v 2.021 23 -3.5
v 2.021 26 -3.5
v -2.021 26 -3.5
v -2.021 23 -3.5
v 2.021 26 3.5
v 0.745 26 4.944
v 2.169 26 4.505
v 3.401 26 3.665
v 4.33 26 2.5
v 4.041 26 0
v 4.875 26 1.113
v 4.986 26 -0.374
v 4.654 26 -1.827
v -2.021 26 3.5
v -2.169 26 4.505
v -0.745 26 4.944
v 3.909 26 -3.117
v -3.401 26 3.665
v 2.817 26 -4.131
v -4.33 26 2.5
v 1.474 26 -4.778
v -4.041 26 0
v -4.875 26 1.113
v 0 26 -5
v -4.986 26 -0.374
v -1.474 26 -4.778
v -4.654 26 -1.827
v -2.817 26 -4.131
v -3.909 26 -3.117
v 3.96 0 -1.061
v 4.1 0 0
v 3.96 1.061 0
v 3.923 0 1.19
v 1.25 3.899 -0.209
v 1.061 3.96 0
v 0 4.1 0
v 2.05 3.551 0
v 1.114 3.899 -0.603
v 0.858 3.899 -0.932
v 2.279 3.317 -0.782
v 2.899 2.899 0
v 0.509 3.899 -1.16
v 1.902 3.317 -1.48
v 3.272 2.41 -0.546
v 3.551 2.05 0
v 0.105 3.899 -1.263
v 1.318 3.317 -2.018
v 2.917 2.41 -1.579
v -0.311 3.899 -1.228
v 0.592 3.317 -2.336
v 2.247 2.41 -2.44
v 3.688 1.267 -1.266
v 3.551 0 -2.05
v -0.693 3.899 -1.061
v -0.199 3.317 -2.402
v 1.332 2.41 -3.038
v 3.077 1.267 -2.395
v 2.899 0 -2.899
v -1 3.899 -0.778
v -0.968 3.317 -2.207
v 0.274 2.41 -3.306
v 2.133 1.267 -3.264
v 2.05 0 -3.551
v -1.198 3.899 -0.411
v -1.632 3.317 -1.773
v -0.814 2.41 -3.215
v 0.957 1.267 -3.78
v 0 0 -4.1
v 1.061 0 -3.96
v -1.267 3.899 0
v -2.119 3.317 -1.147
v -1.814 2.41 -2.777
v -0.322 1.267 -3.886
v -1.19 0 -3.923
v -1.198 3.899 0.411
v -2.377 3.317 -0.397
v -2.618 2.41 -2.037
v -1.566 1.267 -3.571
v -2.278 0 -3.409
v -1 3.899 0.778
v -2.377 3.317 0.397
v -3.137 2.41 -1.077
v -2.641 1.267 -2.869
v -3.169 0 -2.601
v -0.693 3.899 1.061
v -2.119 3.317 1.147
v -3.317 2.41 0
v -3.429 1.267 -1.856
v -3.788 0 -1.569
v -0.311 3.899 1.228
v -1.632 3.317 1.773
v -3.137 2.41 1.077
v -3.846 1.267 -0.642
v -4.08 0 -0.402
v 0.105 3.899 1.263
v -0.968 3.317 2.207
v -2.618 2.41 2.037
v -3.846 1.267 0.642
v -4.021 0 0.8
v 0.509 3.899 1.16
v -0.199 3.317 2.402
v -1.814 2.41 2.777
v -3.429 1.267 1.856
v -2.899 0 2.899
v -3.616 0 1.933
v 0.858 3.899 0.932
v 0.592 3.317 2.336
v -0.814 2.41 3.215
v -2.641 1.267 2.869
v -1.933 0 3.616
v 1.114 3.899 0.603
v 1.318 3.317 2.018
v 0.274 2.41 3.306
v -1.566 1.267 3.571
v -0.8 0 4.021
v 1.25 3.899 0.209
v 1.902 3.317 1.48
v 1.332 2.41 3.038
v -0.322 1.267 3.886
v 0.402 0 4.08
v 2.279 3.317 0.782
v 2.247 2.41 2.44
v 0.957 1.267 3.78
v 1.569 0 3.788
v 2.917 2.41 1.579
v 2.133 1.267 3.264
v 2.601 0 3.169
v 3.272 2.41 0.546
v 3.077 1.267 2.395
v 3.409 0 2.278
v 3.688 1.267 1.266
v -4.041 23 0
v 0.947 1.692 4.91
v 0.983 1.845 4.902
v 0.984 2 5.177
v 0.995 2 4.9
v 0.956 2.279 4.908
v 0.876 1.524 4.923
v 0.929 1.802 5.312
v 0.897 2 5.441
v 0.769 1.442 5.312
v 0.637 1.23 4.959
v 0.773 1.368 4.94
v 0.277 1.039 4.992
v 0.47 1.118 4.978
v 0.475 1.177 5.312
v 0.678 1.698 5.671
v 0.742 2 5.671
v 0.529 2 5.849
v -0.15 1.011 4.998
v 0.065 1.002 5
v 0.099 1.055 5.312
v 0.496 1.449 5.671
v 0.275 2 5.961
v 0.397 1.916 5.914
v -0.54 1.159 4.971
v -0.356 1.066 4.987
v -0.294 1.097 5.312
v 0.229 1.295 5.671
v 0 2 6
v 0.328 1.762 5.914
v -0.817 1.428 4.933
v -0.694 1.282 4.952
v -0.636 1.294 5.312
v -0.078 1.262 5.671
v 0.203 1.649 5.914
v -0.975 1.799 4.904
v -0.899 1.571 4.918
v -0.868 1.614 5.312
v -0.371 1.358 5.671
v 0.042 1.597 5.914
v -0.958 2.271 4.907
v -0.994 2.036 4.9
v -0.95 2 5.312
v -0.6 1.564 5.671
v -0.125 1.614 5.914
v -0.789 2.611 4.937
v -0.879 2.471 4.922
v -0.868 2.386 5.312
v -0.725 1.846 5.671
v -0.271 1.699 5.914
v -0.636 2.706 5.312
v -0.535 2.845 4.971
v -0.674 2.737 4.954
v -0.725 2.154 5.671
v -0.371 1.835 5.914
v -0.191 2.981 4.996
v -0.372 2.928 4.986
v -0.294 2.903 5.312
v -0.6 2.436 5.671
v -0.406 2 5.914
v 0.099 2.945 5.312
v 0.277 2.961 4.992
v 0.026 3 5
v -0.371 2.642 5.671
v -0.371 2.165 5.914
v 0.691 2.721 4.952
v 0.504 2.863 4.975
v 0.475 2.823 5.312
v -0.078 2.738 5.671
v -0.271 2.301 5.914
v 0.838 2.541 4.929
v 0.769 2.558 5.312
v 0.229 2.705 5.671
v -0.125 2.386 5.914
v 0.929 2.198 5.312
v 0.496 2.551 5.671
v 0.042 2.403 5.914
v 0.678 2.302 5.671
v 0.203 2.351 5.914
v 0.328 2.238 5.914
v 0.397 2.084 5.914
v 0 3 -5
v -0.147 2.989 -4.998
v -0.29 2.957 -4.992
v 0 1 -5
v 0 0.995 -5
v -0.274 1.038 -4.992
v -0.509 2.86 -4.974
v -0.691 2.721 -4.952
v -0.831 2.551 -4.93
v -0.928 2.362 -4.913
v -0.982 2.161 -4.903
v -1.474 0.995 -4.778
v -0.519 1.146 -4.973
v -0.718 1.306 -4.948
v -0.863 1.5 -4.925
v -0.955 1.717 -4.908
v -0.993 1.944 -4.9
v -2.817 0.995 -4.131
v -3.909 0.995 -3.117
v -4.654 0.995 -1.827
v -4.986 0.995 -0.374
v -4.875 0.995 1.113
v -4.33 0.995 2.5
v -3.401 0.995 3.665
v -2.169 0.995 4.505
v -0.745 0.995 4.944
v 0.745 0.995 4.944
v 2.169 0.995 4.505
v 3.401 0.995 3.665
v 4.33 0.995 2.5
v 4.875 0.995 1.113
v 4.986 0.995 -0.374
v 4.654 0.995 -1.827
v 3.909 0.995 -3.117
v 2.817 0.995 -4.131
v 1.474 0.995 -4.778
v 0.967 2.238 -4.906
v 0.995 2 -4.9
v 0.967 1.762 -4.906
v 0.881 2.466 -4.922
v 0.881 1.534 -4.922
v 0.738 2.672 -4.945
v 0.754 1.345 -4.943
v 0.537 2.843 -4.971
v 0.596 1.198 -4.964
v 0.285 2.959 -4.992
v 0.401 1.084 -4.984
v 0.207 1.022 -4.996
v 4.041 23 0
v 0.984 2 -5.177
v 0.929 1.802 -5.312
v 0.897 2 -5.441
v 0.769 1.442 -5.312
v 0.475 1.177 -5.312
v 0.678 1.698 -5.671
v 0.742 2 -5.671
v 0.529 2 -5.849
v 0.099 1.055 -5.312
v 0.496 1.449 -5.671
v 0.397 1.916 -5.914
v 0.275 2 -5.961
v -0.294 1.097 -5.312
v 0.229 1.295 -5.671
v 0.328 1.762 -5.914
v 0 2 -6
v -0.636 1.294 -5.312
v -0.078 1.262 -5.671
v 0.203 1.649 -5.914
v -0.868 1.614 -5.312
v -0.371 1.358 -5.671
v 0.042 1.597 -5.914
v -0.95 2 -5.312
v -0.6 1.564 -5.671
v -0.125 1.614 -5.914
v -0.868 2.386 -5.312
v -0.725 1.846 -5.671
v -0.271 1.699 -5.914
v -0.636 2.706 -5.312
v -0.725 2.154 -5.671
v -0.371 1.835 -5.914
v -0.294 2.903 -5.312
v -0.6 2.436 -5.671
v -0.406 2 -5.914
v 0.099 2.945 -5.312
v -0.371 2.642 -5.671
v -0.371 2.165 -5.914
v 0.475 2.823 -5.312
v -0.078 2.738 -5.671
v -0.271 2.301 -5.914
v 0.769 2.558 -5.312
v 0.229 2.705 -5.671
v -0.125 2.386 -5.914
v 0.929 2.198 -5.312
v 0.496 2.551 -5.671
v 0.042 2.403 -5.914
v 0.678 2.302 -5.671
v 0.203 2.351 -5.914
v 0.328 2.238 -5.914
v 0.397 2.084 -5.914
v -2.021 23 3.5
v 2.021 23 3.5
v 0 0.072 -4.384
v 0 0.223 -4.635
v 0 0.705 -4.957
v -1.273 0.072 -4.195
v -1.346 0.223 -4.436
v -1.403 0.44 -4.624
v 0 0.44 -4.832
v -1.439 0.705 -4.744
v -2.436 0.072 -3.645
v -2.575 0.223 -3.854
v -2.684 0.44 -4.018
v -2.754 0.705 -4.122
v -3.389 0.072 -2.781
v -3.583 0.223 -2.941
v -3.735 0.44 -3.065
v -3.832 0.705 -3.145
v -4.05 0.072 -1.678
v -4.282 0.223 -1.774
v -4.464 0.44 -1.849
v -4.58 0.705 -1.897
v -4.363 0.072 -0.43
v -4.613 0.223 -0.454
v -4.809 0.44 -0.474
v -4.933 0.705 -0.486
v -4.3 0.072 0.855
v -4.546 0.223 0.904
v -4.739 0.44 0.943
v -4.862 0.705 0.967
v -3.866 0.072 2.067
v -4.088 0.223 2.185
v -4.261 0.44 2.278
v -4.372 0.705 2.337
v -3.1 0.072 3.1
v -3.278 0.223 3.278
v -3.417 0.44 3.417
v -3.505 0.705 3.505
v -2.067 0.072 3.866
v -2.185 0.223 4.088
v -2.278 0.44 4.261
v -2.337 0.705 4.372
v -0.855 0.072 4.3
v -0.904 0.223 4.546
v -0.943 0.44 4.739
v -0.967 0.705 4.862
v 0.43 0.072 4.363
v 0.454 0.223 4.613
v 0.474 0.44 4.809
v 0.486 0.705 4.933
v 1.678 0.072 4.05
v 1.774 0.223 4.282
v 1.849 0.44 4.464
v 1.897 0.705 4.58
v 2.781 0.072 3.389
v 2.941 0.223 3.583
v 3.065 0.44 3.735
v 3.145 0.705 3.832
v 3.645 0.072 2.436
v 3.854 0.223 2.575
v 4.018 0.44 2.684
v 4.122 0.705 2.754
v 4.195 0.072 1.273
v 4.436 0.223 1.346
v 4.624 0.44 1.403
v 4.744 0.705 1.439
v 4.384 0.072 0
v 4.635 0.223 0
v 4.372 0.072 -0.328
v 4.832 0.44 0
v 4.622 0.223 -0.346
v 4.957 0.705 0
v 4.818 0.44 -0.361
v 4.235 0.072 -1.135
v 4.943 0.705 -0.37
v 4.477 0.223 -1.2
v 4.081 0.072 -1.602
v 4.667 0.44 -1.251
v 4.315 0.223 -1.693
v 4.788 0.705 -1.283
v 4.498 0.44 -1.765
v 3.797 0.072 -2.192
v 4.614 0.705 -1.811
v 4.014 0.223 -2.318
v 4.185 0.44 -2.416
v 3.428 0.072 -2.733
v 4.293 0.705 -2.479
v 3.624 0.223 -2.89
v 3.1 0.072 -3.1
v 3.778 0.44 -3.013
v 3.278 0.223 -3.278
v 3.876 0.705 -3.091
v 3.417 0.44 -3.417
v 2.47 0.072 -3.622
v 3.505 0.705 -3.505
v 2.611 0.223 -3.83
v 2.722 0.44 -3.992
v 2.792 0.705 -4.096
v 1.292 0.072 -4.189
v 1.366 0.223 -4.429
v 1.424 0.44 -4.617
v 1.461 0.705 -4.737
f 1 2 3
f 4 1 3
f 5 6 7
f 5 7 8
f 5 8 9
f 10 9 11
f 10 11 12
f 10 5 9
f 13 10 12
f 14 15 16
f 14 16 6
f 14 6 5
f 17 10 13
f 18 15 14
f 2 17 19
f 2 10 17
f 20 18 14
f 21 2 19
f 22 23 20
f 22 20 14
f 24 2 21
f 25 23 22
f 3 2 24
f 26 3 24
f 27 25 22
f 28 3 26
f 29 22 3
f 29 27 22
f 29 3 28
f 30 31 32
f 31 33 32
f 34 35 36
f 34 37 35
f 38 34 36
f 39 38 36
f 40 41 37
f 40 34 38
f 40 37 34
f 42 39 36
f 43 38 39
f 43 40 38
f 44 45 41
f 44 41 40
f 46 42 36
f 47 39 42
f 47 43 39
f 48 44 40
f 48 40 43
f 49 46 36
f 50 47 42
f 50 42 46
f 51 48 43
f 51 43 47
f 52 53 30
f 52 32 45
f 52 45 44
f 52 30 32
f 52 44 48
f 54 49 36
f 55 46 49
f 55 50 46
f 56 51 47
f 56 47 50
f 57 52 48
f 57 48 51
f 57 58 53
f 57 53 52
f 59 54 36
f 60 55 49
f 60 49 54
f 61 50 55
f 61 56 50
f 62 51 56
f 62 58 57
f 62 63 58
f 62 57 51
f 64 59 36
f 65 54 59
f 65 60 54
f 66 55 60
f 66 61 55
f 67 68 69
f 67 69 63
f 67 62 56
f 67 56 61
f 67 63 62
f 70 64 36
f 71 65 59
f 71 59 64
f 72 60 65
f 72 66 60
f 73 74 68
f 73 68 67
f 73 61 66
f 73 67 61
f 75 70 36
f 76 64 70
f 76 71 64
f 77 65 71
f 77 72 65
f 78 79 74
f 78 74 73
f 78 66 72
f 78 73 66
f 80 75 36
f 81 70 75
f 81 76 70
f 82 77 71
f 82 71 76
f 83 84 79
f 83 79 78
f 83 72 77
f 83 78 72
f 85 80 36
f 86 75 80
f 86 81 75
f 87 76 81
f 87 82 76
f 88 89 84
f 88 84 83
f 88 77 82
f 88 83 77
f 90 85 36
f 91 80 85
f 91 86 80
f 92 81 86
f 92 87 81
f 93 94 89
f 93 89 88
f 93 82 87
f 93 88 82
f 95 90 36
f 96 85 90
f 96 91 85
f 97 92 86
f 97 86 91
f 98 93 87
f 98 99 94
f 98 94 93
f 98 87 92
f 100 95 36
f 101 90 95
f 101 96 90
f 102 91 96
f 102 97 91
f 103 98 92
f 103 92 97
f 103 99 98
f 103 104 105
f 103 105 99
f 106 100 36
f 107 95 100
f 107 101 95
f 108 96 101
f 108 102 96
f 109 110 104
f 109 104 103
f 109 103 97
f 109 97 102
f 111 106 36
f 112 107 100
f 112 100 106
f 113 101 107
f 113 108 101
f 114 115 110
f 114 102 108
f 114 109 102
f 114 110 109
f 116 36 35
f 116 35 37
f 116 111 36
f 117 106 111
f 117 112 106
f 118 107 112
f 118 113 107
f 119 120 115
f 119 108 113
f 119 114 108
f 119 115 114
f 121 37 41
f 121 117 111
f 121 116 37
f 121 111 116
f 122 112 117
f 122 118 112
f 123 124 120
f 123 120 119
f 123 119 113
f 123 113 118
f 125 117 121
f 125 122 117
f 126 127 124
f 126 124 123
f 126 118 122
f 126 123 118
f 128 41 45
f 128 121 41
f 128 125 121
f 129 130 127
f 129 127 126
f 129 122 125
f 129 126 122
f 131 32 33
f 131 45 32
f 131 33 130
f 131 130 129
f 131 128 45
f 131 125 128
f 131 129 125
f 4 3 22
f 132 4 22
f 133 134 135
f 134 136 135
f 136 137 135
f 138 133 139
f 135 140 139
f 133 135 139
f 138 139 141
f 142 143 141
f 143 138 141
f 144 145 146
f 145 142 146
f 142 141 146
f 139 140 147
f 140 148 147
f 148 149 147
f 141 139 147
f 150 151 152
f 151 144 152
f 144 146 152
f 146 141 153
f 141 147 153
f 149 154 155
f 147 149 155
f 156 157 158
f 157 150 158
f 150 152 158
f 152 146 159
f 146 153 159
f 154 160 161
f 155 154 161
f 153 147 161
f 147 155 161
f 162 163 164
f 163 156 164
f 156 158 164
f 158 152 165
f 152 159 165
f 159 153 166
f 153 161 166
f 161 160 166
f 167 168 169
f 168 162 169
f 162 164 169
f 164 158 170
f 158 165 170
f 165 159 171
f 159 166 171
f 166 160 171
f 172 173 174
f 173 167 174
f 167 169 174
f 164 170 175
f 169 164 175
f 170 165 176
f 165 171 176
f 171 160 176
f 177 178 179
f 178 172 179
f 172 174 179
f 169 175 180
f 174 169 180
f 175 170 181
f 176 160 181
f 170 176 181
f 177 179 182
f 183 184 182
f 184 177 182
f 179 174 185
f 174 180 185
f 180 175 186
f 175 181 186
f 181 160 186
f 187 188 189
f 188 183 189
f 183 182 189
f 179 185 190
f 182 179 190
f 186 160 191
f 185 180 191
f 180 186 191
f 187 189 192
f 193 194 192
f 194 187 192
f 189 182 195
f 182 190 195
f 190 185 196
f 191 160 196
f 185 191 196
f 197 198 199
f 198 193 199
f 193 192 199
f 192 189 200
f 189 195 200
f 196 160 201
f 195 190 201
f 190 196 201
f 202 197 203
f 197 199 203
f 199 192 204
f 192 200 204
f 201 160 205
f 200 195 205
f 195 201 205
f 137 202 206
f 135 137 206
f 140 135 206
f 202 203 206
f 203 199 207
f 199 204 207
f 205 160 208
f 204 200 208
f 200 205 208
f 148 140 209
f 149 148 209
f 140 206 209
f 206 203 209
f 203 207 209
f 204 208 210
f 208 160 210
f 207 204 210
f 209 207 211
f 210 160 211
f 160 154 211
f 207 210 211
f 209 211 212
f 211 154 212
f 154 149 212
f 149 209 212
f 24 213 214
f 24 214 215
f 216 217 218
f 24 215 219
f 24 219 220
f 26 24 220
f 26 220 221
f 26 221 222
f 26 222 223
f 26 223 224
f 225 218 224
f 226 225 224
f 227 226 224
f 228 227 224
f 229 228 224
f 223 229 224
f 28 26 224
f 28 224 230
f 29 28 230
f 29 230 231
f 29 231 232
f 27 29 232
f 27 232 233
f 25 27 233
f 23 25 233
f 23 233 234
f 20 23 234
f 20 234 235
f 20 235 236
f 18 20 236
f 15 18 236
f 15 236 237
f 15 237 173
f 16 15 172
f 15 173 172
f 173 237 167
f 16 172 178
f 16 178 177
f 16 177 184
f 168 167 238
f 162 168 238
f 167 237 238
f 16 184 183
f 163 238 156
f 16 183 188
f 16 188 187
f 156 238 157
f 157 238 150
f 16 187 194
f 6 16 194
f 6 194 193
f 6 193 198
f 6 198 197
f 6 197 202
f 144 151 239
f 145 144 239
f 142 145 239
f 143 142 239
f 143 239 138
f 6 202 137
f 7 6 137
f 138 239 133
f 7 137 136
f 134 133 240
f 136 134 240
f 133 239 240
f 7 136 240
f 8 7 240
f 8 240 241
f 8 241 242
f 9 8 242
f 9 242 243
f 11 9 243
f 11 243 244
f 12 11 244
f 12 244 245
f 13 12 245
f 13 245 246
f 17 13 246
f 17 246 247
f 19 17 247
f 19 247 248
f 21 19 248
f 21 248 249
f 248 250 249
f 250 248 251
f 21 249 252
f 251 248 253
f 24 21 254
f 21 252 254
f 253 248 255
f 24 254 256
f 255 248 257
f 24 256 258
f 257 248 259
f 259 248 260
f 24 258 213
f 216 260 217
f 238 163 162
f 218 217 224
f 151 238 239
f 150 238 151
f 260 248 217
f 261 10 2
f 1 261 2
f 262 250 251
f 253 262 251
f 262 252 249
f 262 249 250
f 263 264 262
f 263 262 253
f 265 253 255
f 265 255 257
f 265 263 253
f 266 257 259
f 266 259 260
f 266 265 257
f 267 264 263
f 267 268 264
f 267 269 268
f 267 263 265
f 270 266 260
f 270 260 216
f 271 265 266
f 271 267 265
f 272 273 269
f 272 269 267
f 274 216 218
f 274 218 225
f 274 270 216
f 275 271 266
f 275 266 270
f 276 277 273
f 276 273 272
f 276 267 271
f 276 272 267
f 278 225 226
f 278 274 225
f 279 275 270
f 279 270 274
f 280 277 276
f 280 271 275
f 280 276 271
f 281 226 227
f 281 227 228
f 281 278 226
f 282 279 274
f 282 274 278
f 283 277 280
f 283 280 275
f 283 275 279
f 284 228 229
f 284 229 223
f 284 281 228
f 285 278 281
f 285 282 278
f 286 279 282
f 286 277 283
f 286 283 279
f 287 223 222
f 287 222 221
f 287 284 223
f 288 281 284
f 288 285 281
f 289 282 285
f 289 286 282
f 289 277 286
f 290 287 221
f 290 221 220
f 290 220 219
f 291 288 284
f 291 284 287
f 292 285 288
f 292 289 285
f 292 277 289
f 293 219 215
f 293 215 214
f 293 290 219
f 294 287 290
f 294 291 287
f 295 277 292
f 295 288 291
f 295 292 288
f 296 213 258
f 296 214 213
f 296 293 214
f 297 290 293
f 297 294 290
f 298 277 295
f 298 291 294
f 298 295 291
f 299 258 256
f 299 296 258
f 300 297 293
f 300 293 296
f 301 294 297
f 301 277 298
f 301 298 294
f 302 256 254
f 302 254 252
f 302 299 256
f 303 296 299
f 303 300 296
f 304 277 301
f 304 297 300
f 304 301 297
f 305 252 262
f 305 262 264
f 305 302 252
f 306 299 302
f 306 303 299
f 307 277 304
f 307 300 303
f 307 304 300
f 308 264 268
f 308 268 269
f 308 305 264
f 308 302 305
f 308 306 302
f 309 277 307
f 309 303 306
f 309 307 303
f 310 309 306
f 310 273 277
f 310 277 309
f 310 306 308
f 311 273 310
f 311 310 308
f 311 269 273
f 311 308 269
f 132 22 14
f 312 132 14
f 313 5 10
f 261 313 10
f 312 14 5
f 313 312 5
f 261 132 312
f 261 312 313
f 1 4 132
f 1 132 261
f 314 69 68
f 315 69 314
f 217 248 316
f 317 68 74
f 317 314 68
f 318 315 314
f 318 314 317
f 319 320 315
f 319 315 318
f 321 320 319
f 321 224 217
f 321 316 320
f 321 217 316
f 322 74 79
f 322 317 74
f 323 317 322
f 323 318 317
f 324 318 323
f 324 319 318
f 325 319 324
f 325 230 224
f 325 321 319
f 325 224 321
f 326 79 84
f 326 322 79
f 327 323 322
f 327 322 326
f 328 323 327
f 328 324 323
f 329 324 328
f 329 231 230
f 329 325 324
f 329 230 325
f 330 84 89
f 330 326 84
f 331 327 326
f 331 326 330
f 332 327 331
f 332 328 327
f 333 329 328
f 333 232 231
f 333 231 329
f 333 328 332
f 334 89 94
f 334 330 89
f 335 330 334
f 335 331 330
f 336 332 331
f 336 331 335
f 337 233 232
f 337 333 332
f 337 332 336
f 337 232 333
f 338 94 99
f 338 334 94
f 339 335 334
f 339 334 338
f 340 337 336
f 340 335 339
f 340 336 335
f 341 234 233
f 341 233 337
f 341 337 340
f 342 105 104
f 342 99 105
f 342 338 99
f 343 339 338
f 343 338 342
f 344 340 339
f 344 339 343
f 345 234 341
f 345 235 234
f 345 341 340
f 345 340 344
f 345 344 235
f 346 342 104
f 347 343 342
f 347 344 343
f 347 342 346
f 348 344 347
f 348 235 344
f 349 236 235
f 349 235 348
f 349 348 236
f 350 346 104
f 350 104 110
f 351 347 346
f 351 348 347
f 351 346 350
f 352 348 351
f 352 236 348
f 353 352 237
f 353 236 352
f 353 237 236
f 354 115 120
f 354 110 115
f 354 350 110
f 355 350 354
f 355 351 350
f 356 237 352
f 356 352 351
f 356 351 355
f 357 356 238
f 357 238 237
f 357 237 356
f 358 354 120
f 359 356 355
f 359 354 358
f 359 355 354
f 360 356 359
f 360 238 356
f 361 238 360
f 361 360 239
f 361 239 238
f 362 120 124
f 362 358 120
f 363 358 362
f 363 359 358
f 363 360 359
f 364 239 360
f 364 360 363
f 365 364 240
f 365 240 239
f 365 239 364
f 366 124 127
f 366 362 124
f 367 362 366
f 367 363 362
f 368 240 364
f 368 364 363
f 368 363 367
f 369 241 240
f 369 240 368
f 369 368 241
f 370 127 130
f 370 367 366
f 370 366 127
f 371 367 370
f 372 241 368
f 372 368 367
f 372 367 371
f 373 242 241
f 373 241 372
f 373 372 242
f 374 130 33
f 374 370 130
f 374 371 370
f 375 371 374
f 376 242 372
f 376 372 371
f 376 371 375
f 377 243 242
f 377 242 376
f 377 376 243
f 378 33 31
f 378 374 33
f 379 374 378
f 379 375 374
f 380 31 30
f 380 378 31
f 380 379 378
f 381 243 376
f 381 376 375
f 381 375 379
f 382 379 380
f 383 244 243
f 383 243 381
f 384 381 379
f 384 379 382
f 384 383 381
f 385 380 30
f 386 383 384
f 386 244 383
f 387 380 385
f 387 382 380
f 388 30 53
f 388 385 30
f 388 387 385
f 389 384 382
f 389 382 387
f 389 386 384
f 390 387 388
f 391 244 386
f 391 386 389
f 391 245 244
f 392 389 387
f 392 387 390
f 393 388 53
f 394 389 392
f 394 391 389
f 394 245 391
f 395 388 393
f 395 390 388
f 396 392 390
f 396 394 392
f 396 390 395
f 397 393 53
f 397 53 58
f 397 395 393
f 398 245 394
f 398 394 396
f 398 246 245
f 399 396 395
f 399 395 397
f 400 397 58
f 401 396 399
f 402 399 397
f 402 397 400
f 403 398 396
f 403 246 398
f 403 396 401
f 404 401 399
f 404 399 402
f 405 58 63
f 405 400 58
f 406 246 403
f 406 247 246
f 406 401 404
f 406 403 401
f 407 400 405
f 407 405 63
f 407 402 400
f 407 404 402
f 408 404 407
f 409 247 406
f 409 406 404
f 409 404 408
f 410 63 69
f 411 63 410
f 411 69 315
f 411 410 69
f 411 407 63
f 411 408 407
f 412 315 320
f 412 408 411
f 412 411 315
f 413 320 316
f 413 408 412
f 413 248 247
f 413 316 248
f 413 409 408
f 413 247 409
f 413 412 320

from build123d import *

# Parameters (mm, degrees)
SKETCH1_R           = 5
BOSS_EXTRUDE1_DEPTH = 26
CUT_EXTRUDE1_DEPTH  = 3
FILLET1_R           = 1


with BuildPart() as part:
    # Sketch1 → Boss-Extrude1 (new body)
    with BuildSketch(Plane(origin=(0, 0, 0), x_dir=(1, 0, 0), z_dir=(0, 1, 0))):
        with Locations(Location((0, 0, 0), (0, 0, 90))):
            Circle(SKETCH1_R)
    extrude(amount=BOSS_EXTRUDE1_DEPTH)

    # Sketch2 → Cut-Revolve1 (revolve, cut)
    with BuildSketch(Plane.XY):
        with BuildLine():
            Line((0, -4.1), (0, 4.1))
            ThreePointArc((0, 4.1), (4.1, 0), (0, -4.1))
        make_face()
    revolve(axis=Axis((0, -4.1, 0), (0, 1, 0)), mode=Mode.SUBTRACT)

    # Sketch4 → Revolve1 (revolve)
    with BuildSketch(Plane(origin=(0, 2, 0), x_dir=(1, 0, 0), z_dir=(0, 1, 0))):
        with BuildLine():
            Line((0, 6), (0, 5))
            ThreePointArc((0, 5), (0.5, 4.974937186), (0.994987437, 4.9))
            ThreePointArc((0.994987437, 4.9), (0.741619849, 5.670820393), (0, 6))
        make_face()
    revolve1 = revolve(axis=Axis((0, 2, 0), (0, 0, -1)))

    # Sketch5 → Cut-Extrude1 (cut)
    with BuildSketch(Plane(origin=(0, 26, 0), x_dir=(1, 0, 0), z_dir=(0, 1, 0))):
        Polygon((-4.041451884, 0), (-2.020725942, -3.5), (2.020725942, -3.5), (4.041451884, 0), (2.020725942, 3.5), (-2.020725942, 3.5), align=None)
    extrude(amount=-CUT_EXTRUDE1_DEPTH, mode=Mode.SUBTRACT)

    # Mirror1: Revolve1 across plane
    add(revolve1.mirror(Plane.XY))

    # Fillet1
    # the kernel refuses this fillet: 1 mm, written as the material it takes off along each edge
    with BuildSketch(Plane(origin=(0, 0, 0), x_dir=(0, 0, -1), z_dir=(1, 0, 0))) as fillet1_piece_1:
        with BuildLine():
            CenterArc((4, 0.994987437), FILLET1_R, 275.739170477, 84.260829523)
            Line((4.1, 0), (4.102, -0.019899749))
            ThreePointArc((4.102, -0.019899749), (4.55, -0.02), (5, -0.02))
            Line((5, -0.02), (5.02, 0))
            Line((5.02, 0), (5.02, 0.994987437))
            Line((5.02, 0.994987437), (5, 0.994987437))
        make_face()
    revolve(axis=Axis((0, 0, 0), (0, 1, 0)), mode=Mode.SUBTRACT)


solid = part.part
